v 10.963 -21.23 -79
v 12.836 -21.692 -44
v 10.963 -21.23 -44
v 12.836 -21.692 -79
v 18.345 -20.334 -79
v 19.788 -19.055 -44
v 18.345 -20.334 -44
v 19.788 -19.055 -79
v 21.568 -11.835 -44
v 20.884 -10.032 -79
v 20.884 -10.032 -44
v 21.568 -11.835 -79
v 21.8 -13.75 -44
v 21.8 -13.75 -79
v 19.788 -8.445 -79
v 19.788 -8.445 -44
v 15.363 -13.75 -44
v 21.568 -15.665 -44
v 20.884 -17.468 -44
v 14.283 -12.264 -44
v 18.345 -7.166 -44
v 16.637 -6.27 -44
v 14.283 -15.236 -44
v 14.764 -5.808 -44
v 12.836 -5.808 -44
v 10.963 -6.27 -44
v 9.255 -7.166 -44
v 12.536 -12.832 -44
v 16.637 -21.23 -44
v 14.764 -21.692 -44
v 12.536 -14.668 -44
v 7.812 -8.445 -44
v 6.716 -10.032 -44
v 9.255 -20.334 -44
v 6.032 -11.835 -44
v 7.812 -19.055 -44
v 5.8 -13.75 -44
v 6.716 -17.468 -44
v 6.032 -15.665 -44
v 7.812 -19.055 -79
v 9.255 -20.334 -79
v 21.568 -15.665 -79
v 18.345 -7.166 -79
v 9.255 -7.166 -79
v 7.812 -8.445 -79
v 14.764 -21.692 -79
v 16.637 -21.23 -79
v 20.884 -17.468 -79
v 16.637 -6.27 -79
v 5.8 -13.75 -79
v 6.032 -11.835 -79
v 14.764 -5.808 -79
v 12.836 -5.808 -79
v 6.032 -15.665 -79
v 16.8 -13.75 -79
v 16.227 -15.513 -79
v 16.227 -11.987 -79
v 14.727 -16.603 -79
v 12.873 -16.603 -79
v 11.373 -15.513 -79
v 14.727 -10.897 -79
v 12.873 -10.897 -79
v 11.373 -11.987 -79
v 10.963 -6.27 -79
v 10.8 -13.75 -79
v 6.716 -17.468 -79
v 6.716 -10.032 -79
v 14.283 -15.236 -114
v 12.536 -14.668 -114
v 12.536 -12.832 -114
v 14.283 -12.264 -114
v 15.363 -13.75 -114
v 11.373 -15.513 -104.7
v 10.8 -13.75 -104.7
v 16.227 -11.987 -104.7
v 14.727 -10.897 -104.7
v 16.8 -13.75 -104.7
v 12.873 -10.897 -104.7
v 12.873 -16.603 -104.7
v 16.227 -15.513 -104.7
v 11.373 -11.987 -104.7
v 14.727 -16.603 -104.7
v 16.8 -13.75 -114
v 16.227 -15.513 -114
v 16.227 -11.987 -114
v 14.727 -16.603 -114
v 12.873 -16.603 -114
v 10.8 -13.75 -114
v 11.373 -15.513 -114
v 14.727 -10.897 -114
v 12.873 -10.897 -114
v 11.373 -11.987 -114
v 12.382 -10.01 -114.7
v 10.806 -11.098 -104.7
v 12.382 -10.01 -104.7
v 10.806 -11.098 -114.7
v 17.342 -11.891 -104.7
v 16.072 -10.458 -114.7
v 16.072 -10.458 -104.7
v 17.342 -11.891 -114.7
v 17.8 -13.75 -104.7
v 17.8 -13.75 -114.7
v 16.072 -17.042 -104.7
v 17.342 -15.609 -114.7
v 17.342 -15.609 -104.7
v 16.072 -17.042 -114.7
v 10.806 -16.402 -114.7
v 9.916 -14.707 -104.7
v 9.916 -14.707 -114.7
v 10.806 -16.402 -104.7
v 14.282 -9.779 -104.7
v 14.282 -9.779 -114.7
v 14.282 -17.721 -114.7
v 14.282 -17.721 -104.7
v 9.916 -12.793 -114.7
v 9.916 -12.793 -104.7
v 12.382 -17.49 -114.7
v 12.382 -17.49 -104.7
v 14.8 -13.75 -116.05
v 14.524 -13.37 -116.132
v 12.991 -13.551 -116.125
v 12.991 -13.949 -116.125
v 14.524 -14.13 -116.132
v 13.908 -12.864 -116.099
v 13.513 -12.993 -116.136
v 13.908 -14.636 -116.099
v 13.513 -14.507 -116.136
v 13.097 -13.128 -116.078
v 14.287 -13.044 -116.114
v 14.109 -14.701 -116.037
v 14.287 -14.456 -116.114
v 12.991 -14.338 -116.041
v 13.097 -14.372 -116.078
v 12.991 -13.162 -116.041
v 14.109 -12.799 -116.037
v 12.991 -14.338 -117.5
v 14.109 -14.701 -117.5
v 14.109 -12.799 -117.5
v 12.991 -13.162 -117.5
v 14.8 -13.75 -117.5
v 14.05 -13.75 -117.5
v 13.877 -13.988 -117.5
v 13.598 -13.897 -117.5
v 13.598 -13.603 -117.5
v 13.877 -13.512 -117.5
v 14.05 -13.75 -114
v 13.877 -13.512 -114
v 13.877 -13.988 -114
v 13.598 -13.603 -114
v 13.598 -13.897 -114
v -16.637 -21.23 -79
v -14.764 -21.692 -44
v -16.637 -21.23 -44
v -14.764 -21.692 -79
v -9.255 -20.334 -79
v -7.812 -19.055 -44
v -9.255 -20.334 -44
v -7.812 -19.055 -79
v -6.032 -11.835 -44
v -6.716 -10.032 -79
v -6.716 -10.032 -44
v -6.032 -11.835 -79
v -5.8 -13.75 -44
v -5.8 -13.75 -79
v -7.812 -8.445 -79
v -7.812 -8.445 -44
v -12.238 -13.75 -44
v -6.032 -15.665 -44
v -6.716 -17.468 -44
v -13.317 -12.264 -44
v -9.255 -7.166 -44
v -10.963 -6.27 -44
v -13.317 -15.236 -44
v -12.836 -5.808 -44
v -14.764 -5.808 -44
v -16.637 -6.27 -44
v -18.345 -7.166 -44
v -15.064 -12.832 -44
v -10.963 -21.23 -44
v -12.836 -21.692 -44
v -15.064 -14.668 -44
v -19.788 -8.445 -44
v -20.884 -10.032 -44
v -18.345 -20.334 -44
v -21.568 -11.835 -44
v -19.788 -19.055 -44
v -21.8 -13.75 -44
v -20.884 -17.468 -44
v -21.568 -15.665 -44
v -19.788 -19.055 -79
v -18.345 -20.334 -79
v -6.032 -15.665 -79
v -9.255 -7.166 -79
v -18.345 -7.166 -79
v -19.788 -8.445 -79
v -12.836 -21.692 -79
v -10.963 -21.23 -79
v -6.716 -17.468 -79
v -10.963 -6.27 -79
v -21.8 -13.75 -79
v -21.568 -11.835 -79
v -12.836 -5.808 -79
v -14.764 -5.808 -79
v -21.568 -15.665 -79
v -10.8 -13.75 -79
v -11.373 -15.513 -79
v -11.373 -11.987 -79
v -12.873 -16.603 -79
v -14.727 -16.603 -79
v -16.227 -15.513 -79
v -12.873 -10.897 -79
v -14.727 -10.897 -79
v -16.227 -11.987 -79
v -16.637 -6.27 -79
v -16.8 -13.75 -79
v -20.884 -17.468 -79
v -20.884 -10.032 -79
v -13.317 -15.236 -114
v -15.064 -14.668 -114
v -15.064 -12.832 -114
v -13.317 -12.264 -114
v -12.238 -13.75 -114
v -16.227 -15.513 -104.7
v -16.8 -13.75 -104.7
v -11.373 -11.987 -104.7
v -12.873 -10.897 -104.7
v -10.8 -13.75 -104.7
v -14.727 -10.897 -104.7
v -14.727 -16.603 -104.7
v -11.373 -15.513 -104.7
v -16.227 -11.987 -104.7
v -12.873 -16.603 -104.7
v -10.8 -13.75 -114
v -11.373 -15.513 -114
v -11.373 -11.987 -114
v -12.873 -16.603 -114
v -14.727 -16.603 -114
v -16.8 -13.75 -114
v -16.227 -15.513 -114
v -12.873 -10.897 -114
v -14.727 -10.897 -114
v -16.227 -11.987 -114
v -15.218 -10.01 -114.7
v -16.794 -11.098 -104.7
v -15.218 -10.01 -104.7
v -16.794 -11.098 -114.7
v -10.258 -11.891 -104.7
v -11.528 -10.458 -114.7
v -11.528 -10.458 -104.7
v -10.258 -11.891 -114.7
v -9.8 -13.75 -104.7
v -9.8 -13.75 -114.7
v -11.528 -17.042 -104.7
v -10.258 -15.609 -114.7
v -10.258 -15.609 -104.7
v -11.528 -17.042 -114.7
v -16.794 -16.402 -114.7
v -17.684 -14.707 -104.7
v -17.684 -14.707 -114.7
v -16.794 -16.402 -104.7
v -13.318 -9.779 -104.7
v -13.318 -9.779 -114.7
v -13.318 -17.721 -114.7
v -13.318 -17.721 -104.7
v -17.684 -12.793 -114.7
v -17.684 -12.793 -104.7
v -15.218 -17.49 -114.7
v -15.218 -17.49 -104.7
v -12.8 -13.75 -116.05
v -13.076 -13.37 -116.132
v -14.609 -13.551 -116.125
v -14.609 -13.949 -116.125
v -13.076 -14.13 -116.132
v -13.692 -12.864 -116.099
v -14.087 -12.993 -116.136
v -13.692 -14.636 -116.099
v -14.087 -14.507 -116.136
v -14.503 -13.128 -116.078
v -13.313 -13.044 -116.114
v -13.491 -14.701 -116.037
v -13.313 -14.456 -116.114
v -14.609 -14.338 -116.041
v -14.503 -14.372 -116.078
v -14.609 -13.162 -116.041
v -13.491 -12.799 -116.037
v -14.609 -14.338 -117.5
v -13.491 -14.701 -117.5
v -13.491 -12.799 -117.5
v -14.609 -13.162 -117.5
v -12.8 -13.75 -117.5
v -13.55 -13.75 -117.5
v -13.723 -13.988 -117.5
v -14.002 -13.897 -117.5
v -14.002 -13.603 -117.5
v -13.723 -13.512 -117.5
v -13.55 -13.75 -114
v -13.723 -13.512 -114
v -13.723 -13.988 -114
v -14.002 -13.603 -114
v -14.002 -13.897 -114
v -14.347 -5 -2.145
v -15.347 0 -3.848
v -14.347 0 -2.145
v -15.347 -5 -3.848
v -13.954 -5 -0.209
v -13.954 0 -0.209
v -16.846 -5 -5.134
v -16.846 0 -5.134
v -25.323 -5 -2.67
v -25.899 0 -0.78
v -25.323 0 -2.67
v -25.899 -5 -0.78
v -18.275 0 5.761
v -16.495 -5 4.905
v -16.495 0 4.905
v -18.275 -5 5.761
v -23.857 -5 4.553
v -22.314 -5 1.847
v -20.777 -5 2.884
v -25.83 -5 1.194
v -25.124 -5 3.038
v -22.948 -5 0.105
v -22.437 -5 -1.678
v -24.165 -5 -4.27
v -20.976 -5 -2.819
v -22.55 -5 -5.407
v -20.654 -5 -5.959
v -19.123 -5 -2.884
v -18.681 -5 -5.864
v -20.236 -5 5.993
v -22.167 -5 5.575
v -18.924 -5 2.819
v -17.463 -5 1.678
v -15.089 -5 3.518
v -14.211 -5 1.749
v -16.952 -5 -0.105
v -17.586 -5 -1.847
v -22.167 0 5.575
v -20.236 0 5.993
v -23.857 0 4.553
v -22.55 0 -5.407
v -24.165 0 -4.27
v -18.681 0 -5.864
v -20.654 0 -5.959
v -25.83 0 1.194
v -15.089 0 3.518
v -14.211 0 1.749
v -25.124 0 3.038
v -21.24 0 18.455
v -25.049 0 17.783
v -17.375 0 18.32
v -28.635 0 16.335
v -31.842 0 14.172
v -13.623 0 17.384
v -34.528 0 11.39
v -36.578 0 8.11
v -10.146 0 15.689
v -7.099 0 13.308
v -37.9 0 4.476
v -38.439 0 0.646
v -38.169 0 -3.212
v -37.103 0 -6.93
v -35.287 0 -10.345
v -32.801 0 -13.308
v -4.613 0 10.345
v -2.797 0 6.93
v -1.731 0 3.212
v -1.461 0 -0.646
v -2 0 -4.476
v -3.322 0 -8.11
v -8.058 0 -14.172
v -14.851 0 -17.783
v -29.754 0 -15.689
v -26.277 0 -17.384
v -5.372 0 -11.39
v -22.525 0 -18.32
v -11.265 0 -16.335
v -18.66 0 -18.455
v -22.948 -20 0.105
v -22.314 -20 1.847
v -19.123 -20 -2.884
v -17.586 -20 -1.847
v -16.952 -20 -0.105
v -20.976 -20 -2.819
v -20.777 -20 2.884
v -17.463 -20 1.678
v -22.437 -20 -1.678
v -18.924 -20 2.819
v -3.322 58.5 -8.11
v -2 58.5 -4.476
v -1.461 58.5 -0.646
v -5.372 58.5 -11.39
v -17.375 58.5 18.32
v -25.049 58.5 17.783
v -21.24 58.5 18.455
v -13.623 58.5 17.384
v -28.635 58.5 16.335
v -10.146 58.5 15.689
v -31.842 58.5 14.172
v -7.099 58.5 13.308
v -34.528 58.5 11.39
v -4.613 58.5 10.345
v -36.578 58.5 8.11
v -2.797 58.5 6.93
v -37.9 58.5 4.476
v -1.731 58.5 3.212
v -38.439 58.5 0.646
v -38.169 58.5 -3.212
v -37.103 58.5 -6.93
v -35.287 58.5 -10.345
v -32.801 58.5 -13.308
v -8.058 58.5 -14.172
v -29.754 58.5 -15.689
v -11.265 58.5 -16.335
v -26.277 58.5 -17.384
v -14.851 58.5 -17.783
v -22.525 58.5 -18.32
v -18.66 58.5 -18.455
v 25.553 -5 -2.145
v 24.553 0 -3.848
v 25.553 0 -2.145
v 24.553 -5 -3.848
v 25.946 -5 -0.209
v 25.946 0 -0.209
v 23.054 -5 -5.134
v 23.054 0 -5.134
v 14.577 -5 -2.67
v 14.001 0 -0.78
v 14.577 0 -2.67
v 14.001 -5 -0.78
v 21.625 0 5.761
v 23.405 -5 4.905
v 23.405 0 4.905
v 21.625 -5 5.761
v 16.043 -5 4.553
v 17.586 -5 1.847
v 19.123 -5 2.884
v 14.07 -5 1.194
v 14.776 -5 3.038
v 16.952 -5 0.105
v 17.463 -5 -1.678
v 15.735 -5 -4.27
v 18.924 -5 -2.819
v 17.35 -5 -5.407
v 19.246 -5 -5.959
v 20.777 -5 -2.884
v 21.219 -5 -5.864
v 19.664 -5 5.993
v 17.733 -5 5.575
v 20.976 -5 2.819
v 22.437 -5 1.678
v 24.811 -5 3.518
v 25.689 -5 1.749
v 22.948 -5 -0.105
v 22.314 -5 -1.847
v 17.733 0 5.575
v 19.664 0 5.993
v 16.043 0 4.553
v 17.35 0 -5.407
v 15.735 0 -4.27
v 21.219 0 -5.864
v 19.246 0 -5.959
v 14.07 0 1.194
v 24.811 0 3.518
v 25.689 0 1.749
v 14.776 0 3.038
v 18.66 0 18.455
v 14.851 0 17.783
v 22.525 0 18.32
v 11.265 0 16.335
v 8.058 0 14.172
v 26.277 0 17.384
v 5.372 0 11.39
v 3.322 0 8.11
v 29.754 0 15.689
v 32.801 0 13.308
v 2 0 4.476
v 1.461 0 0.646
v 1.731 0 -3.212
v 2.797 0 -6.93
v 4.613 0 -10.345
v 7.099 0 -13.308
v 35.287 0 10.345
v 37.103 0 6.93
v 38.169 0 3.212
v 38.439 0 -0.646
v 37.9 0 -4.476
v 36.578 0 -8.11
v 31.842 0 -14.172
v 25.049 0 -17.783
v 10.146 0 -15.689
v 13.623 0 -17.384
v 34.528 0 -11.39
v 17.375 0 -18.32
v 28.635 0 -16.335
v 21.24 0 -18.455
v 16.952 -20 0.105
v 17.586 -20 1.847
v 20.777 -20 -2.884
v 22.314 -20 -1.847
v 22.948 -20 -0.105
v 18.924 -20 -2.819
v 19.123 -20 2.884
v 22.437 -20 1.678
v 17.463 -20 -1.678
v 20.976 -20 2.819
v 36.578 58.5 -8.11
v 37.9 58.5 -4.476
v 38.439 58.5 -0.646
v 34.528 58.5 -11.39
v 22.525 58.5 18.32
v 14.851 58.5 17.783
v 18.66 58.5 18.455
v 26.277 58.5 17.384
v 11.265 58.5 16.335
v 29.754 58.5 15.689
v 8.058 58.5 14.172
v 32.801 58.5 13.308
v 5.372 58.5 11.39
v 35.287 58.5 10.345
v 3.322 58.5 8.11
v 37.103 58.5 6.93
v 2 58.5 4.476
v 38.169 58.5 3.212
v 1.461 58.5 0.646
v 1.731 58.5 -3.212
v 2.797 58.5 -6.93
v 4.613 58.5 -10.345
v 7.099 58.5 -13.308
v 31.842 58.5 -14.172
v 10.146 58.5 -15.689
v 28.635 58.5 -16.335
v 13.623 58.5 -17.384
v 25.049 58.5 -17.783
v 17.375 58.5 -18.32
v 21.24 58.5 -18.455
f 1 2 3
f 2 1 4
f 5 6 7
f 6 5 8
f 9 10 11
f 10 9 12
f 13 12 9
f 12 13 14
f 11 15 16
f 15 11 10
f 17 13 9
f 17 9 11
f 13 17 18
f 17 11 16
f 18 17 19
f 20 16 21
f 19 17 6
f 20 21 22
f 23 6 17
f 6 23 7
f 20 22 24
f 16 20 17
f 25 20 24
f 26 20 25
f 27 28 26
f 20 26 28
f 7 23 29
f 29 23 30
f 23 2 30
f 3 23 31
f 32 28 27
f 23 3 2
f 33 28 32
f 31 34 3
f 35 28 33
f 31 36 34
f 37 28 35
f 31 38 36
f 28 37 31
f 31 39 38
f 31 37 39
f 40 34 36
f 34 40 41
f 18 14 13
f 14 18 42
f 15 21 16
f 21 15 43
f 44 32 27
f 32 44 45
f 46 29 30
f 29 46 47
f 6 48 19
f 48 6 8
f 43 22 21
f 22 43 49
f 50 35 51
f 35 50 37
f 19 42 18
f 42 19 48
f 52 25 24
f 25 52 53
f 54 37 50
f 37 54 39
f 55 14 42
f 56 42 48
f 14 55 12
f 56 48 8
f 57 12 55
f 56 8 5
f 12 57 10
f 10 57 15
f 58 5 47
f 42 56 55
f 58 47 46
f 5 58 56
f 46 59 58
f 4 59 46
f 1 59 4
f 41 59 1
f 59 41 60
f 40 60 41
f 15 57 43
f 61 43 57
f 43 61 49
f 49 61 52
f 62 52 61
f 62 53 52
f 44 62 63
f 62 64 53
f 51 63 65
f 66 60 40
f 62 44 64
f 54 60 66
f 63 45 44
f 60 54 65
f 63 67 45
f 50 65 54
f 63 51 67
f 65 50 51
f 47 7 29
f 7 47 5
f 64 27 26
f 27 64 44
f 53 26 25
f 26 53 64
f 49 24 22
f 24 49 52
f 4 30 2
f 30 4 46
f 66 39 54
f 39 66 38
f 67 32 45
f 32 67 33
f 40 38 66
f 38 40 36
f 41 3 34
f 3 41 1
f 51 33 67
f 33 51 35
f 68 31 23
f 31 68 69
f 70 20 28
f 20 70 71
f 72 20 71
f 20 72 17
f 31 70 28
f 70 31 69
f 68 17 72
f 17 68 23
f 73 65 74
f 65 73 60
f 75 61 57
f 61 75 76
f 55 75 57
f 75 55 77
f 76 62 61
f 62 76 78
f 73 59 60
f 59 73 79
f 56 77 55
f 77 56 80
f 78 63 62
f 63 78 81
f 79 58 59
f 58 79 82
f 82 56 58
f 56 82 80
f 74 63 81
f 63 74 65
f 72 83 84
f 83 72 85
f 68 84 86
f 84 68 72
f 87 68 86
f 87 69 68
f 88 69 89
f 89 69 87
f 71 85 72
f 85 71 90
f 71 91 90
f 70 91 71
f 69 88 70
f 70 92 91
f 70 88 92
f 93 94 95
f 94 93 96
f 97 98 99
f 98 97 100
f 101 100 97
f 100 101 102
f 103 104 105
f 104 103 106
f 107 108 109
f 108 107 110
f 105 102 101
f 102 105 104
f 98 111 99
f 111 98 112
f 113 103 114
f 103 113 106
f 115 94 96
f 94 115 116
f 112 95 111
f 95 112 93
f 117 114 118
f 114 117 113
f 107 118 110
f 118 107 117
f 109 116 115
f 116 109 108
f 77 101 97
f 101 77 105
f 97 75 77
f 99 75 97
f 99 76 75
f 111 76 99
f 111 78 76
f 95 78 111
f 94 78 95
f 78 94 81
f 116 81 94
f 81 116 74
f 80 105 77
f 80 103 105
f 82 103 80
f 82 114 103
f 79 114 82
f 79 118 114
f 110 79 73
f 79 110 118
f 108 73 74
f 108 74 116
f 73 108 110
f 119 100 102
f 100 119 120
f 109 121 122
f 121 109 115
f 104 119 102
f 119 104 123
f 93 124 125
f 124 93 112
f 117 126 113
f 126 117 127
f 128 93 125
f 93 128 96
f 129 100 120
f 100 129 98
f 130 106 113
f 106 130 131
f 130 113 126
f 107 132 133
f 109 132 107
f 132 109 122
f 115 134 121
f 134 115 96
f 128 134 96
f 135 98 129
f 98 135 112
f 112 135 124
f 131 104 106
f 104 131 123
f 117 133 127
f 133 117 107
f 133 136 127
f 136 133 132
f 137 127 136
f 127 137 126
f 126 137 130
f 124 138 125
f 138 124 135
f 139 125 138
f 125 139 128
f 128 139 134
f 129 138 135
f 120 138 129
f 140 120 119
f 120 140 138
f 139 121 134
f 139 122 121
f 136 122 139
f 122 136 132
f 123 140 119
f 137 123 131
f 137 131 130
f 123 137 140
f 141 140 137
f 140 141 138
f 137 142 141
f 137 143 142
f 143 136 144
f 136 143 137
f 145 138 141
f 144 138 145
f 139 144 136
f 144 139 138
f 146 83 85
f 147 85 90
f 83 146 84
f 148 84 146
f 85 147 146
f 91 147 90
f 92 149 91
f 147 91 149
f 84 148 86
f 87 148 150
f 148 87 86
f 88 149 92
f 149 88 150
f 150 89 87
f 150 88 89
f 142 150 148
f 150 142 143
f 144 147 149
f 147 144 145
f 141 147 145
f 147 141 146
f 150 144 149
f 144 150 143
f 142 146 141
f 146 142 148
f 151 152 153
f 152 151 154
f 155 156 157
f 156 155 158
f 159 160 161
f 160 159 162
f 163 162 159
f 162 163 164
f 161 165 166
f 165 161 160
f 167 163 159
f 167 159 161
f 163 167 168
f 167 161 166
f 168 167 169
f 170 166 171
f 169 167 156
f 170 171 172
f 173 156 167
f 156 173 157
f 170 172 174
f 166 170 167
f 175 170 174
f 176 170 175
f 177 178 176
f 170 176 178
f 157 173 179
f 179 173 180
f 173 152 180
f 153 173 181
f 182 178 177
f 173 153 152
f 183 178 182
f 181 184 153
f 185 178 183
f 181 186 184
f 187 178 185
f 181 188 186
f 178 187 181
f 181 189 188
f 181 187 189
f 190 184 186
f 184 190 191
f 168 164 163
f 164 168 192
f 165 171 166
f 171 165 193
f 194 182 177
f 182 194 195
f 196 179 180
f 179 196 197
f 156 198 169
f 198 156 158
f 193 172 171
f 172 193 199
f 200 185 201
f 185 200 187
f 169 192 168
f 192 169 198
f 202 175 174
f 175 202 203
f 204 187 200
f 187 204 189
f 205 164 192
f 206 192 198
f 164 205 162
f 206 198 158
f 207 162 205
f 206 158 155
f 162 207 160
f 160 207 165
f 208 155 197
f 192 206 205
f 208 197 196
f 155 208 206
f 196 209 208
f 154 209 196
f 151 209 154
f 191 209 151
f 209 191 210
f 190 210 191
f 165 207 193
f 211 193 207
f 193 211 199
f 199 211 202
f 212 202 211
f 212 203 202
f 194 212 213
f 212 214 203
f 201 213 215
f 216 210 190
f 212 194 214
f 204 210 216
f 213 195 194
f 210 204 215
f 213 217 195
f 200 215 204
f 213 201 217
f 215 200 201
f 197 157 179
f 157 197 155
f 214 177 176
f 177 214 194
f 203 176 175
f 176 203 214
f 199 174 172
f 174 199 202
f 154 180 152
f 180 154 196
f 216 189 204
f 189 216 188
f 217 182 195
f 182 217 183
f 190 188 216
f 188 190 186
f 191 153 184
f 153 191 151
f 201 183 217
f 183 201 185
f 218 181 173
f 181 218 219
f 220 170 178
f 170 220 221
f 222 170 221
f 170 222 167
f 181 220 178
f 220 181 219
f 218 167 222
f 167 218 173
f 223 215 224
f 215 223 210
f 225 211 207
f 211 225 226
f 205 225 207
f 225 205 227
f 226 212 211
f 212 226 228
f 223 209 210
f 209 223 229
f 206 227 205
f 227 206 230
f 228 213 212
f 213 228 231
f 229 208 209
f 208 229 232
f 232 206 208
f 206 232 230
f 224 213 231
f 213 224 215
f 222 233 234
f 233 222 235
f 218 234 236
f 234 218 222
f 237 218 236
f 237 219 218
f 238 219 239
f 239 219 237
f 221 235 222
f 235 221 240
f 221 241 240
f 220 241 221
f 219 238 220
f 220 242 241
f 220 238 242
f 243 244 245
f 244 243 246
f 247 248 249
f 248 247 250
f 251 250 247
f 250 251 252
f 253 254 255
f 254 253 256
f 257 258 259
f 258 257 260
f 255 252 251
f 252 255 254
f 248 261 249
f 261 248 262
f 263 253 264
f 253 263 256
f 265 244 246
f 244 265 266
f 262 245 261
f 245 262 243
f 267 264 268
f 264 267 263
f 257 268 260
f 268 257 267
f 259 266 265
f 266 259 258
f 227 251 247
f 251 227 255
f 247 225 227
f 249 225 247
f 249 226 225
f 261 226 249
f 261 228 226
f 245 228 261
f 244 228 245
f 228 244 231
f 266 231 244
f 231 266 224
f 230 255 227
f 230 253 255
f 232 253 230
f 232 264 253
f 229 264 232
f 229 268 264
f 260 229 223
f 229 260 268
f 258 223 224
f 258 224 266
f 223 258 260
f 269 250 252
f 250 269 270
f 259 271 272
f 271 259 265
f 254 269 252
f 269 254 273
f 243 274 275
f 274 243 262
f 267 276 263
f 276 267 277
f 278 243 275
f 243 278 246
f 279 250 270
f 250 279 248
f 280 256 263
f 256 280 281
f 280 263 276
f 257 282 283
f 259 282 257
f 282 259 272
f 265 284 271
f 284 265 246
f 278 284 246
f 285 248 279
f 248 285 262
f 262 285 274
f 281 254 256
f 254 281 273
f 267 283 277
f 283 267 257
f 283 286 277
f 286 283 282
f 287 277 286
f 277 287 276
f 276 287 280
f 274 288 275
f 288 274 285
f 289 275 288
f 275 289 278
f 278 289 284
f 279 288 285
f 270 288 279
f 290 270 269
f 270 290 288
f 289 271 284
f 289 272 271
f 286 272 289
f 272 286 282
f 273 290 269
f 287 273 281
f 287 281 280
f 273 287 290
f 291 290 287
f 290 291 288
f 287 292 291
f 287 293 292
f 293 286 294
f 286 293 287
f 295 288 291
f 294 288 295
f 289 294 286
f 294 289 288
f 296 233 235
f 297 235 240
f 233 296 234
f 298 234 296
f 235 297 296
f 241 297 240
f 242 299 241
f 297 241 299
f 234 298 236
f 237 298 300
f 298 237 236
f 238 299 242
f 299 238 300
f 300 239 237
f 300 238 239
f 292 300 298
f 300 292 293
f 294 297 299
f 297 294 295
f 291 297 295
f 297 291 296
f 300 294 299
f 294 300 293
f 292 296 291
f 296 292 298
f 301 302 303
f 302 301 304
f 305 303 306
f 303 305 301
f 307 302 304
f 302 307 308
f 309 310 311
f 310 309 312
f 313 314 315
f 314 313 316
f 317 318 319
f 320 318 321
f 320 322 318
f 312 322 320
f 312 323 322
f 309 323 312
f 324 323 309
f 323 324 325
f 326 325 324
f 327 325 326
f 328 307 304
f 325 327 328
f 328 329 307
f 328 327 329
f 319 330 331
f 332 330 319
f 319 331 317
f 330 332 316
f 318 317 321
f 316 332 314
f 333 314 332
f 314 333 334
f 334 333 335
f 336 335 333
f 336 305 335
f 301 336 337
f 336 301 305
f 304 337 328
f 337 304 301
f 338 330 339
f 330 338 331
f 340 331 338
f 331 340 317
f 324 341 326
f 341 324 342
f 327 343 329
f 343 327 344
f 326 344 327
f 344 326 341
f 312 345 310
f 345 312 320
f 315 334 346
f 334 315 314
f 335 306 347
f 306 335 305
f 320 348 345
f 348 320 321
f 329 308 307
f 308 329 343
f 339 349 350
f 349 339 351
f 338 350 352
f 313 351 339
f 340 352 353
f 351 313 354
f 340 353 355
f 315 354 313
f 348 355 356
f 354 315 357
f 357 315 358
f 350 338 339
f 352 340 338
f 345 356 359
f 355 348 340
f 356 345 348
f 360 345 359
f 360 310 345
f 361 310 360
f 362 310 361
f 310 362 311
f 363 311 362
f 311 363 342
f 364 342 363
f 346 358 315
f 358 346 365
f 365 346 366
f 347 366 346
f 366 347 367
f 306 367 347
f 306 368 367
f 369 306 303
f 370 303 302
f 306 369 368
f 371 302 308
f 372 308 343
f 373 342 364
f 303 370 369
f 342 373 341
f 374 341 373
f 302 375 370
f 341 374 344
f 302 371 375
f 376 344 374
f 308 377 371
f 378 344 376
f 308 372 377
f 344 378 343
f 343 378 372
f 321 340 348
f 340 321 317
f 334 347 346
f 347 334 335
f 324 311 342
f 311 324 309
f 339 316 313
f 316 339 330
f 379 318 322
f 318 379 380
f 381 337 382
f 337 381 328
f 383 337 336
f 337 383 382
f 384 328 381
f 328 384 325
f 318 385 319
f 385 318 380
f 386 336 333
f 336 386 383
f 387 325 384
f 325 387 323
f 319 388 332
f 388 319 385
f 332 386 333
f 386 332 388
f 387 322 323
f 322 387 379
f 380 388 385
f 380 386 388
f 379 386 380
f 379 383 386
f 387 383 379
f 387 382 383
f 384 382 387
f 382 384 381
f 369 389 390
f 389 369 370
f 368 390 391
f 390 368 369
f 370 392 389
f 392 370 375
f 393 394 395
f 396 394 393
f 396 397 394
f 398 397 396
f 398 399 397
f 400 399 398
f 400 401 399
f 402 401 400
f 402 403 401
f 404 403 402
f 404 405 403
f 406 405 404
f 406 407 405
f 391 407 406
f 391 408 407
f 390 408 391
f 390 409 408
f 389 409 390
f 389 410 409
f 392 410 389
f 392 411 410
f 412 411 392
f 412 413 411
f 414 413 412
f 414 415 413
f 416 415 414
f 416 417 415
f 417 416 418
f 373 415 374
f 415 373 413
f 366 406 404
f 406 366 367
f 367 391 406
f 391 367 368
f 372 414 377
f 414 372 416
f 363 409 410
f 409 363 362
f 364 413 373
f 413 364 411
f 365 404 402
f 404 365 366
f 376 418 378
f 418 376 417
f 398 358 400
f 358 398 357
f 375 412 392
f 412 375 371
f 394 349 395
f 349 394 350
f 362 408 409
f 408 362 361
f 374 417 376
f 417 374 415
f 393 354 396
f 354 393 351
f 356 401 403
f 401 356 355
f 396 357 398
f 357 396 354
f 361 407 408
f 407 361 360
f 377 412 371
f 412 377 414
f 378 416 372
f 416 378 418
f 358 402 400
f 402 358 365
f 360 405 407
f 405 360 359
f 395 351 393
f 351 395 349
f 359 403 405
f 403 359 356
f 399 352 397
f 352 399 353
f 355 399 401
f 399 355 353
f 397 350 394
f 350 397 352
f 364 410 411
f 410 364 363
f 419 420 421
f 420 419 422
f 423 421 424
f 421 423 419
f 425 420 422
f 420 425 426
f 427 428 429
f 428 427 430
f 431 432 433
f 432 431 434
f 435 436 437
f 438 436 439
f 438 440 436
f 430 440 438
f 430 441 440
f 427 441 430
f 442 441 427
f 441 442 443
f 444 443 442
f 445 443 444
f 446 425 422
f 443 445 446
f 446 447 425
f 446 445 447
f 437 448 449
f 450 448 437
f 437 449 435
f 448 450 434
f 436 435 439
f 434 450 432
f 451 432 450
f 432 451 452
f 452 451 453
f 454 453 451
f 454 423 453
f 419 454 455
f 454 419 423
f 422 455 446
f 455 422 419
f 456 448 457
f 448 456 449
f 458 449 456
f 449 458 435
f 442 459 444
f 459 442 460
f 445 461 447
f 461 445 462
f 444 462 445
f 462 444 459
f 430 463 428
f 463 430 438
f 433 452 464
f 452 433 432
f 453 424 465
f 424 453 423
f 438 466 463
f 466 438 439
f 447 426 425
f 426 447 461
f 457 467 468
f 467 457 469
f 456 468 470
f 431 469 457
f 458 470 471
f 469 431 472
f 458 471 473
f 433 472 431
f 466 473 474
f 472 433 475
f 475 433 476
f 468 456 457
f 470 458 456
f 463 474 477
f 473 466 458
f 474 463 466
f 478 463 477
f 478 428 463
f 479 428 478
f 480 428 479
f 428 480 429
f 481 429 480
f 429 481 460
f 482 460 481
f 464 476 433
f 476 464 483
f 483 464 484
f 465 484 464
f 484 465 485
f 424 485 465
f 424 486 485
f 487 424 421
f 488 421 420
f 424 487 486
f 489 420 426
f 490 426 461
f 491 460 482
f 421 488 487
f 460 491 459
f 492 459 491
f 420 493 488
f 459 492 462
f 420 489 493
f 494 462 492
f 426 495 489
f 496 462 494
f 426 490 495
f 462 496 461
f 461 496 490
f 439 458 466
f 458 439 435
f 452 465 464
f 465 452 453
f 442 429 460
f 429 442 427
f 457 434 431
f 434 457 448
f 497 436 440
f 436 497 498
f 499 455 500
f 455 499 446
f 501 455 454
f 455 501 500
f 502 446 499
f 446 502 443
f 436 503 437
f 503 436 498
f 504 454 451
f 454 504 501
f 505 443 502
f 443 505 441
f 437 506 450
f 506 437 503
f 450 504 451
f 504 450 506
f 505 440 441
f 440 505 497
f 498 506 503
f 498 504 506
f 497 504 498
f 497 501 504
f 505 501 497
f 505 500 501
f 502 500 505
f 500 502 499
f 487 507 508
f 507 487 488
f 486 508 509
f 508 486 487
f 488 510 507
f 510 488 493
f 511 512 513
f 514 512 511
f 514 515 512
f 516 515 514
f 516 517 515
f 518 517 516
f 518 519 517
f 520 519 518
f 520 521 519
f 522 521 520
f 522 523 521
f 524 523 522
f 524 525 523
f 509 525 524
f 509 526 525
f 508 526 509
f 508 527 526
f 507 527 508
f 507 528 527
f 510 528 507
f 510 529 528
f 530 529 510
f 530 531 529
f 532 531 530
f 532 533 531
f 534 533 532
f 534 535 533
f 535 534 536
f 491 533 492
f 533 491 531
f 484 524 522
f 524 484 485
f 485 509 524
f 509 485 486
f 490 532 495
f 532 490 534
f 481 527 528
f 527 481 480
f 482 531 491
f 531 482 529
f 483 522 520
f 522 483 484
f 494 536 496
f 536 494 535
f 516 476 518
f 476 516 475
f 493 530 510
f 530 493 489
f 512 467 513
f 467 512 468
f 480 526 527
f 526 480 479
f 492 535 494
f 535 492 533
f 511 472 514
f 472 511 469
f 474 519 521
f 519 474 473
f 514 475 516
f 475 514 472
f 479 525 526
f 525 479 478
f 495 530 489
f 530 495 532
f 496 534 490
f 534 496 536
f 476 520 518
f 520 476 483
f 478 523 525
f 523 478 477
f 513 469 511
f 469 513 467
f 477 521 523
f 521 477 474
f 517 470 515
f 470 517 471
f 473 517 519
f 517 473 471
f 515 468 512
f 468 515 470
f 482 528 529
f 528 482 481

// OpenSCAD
acrylicThickness = 5.5;
steelThickness = 1.0;

dinoX = 44.125;
dinoY = 79;
dinoZ = 139;

heaterZ = 70.5;
heaterY = 33;

filamentWidth = 3.125;

heaterBarrelLength = 50;
heaterBarrelOD = 6;
heaterBarrelID = 3.125;

insulatorLength = 35;
insulatorOD = 16;
insulatorOverlap = 15;
insulatorID = 3.125;

nozzleOD = 8;
nozzleHeight = 10;
nozzleConeHeight1 = 1.80;
nozzleConeHeight2 = 2.80;
nozzleTipWidth = 2;
nozzleOverlap = 9.3;
nozzleDiameter = 0.5;

motorDiameter = 37;
motorLength = 58.5;
motorStubDiameter = 12;
motorStubLength = 5;
motorShaftDiameter = 6;
motorShaftLength = 15;


plastruderMK5();

module plastruderMK5()
{
	rotate([90, 0, 0])
	{
		motorPlate();
		spacerPlate();
		filamentGuide();
		retainerPlate();

		leftDino();
		rightDino();

		heaterAssembly();
	}
	translate([-19.95, 0, 0])
		gearMotor();
	translate([19.95, 0, 0])
		gearMotor();
}

module gearMotor()
{
	rotate([-90, 2, 0])
	{
		union()
		{
			cylinder(h=motorLength, r=motorDiameter/2);
			translate([0,0,-motorStubLength])
			{
				cylinder(h=motorStubLength, r=motorStubDiameter/2);
				translate([0,0,-motorShaftLength])
					cylinder(h=motorShaftLength, r=motorShaftDiameter/2);
			}
		}
	}
}

module heaterBarrelAssembly()
{
	translate([0,0,-(heaterBarrelLength-insulatorOverlap+insulatorLength)])
	//translate([0,0,0)])
	{
		translate([0,0,heaterBarrelLength-insulatorOverlap])
		{
			thermalBarrier();
			retainingWasher();
		}
		heaterBarrel();
		translate([0,0,-(nozzleHeight-nozzleOverlap)])
			nozzle();
	}
}

module heaterBarrel()
{
	difference()
	{
		cylinder(h=heaterBarrelLength, r=heaterBarrelOD/2);
		cylinder(h=heaterBarrelLength, r=heaterBarrelID/2);
	}
}

module thermalBarrier()
{
	difference()
	{
		cylinder(h=insulatorLength, r=insulatorOD/2);
		cylinder(h=insulatorLength, r=filamentWidth/2);
		cylinder(h=insulatorOverlap, r=heaterBarrelOD/2);
	}
}

module retainingWasher()
{
	translate([13.76, -70.50, -steelThickness])
	{
		dxf_linear_extrude(
			file = "main-assembly.dxf",
			layer = "Steel Washer",
			height = steelThickness,
			convexity = 10
		);
	}
}

module nozzle()
{
	difference()
	{
		union()
		{
			cylinder(h=nozzleHeight, r=nozzleOD/2);
	
			translate([0,0,-nozzleConeHeight1])
				cylinder(h=nozzleConeHeight1, r1=0, r2=nozzleOD/2);
			translate([0,0,-nozzleConeHeight2])
				cylinder(h=nozzleConeHeight2, r=nozzleTipWidth/2);
		}
		translate([0,0,nozzleHeight-nozzleOverlap])
		{
			cylinder(h=nozzleOverlap, r=heaterBarrelOD/2);
		}
		translate([0,0,-nozzleConeHeight2])
		{
			cylinder(h=nozzleConeHeight2+nozzleHeight, r=nozzleDiameter/2);
		}
	}
}

module heaterAssembly()
{
	heaterMount();
	rotate([-90, 0, 0])
	{
		translate([13.8,-(acrylicThickness*2.5),-(33+acrylicThickness*2)])
			heaterBarrelAssembly();
		translate([-13.8,-(acrylicThickness*2.5),-(33+acrylicThickness*2)])
			heaterBarrelAssembly();
	}
}

module heaterMount()
{
	translate([0,-heaterY,heaterZ+acrylicThickness*2.5])
	{
		rotate([-90, 0, 0])
		{
			translate([0,0,-acrylicThickness])
				acrylicPlate("Heater Mount");
			translate([0,0,-acrylicThickness*2])
				acrylicPlate("Insulator Top");
			translate([0,0,-acrylicThickness*3])
				acrylicPlate("Insulator Retainer");
		}
	}
}


module motorPlate()
{
	acrylicPlate("Motor Plate");
}

module spacerPlate()
{
	translate([0,0,acrylicThickness*1])
		acrylicPlate("Spacer Plate");
}

module filamentGuide()
{
	translate([0,0,acrylicThickness*2])
		acrylicPlate("Filament Guide");
}

module retainerPlate()
{
	translate([0,0,acrylicThickness*3])
		acrylicPlate("Retainer Plate");
}

module leftDino()
{
	leftDinoFront();
	leftDinoBack();

	translate([-dinoX, 0, 0])
		dinoSupport();

	leftDinoTop();
	leftDinoBottom();
}

module leftDinoFront()
{
	translate([0,0,acrylicThickness*4])
		acrylicPlate("Dino Left Front");
}

module leftDinoBack()
{
	translate([0, 0, -acrylicThickness])
		acrylicPlate("Dino Left Back");
}

module leftDinoTop()
{
	translate([0,-dinoY, dinoZ-acrylicThickness*1.5])
	{
		rotate([90, 0, 0])
			acrylicPlate("Dino Left Top Mount");
	}
}

module leftDinoBottom()
{
	translate([0,-(dinoY+acrylicThickness), dinoZ+50-acrylicThickness*1.5])
	{
		rotate([90,0,0])
			acrylicPlate("Dino Left Bottom Mount");
	}
}

module rightDino()
{
	rightDinoFront();
	rightDinoBack();

	translate([dinoX, 0, 0])
		dinoSupport();

	rightDinoTop();
	rightDinoBottom();
}

module rightDinoFront()
{
	translate([0,0,acrylicThickness*4])
		acrylicPlate("Dino Right Front");
}

module rightDinoBack()
{
	translate([0, 0, -acrylicThickness])
		acrylicPlate("Dino Right Back");
}


module rightDinoTop()
{
	translate([0,-dinoY, dinoZ-acrylicThickness*1.5])
	{
		rotate([90, 0, 0])
			acrylicPlate("Dino Right Top Mount");
	}
}

module rightDinoBottom()
{
	translate([0,-(dinoY+acrylicThickness), dinoZ+50-acrylicThickness*1.5])
	{
		rotate([90,0,0])
			acrylicPlate("Dino Right Bottom Mount");
	}
}

module dinoSupport()
{
	translate([-acrylicThickness/2, 0, acrylicThickness*2])
	{
		rotate([0, 90, 0])
			acrylicPlate("Dino Support");
	}
}

module acrylicPlate(layer)
{
	dxf_linear_extrude(
		file = "main-assembly.dxf",
		layer = layer,
		height = acrylicThickness,
		convexity = 10
	);
}
